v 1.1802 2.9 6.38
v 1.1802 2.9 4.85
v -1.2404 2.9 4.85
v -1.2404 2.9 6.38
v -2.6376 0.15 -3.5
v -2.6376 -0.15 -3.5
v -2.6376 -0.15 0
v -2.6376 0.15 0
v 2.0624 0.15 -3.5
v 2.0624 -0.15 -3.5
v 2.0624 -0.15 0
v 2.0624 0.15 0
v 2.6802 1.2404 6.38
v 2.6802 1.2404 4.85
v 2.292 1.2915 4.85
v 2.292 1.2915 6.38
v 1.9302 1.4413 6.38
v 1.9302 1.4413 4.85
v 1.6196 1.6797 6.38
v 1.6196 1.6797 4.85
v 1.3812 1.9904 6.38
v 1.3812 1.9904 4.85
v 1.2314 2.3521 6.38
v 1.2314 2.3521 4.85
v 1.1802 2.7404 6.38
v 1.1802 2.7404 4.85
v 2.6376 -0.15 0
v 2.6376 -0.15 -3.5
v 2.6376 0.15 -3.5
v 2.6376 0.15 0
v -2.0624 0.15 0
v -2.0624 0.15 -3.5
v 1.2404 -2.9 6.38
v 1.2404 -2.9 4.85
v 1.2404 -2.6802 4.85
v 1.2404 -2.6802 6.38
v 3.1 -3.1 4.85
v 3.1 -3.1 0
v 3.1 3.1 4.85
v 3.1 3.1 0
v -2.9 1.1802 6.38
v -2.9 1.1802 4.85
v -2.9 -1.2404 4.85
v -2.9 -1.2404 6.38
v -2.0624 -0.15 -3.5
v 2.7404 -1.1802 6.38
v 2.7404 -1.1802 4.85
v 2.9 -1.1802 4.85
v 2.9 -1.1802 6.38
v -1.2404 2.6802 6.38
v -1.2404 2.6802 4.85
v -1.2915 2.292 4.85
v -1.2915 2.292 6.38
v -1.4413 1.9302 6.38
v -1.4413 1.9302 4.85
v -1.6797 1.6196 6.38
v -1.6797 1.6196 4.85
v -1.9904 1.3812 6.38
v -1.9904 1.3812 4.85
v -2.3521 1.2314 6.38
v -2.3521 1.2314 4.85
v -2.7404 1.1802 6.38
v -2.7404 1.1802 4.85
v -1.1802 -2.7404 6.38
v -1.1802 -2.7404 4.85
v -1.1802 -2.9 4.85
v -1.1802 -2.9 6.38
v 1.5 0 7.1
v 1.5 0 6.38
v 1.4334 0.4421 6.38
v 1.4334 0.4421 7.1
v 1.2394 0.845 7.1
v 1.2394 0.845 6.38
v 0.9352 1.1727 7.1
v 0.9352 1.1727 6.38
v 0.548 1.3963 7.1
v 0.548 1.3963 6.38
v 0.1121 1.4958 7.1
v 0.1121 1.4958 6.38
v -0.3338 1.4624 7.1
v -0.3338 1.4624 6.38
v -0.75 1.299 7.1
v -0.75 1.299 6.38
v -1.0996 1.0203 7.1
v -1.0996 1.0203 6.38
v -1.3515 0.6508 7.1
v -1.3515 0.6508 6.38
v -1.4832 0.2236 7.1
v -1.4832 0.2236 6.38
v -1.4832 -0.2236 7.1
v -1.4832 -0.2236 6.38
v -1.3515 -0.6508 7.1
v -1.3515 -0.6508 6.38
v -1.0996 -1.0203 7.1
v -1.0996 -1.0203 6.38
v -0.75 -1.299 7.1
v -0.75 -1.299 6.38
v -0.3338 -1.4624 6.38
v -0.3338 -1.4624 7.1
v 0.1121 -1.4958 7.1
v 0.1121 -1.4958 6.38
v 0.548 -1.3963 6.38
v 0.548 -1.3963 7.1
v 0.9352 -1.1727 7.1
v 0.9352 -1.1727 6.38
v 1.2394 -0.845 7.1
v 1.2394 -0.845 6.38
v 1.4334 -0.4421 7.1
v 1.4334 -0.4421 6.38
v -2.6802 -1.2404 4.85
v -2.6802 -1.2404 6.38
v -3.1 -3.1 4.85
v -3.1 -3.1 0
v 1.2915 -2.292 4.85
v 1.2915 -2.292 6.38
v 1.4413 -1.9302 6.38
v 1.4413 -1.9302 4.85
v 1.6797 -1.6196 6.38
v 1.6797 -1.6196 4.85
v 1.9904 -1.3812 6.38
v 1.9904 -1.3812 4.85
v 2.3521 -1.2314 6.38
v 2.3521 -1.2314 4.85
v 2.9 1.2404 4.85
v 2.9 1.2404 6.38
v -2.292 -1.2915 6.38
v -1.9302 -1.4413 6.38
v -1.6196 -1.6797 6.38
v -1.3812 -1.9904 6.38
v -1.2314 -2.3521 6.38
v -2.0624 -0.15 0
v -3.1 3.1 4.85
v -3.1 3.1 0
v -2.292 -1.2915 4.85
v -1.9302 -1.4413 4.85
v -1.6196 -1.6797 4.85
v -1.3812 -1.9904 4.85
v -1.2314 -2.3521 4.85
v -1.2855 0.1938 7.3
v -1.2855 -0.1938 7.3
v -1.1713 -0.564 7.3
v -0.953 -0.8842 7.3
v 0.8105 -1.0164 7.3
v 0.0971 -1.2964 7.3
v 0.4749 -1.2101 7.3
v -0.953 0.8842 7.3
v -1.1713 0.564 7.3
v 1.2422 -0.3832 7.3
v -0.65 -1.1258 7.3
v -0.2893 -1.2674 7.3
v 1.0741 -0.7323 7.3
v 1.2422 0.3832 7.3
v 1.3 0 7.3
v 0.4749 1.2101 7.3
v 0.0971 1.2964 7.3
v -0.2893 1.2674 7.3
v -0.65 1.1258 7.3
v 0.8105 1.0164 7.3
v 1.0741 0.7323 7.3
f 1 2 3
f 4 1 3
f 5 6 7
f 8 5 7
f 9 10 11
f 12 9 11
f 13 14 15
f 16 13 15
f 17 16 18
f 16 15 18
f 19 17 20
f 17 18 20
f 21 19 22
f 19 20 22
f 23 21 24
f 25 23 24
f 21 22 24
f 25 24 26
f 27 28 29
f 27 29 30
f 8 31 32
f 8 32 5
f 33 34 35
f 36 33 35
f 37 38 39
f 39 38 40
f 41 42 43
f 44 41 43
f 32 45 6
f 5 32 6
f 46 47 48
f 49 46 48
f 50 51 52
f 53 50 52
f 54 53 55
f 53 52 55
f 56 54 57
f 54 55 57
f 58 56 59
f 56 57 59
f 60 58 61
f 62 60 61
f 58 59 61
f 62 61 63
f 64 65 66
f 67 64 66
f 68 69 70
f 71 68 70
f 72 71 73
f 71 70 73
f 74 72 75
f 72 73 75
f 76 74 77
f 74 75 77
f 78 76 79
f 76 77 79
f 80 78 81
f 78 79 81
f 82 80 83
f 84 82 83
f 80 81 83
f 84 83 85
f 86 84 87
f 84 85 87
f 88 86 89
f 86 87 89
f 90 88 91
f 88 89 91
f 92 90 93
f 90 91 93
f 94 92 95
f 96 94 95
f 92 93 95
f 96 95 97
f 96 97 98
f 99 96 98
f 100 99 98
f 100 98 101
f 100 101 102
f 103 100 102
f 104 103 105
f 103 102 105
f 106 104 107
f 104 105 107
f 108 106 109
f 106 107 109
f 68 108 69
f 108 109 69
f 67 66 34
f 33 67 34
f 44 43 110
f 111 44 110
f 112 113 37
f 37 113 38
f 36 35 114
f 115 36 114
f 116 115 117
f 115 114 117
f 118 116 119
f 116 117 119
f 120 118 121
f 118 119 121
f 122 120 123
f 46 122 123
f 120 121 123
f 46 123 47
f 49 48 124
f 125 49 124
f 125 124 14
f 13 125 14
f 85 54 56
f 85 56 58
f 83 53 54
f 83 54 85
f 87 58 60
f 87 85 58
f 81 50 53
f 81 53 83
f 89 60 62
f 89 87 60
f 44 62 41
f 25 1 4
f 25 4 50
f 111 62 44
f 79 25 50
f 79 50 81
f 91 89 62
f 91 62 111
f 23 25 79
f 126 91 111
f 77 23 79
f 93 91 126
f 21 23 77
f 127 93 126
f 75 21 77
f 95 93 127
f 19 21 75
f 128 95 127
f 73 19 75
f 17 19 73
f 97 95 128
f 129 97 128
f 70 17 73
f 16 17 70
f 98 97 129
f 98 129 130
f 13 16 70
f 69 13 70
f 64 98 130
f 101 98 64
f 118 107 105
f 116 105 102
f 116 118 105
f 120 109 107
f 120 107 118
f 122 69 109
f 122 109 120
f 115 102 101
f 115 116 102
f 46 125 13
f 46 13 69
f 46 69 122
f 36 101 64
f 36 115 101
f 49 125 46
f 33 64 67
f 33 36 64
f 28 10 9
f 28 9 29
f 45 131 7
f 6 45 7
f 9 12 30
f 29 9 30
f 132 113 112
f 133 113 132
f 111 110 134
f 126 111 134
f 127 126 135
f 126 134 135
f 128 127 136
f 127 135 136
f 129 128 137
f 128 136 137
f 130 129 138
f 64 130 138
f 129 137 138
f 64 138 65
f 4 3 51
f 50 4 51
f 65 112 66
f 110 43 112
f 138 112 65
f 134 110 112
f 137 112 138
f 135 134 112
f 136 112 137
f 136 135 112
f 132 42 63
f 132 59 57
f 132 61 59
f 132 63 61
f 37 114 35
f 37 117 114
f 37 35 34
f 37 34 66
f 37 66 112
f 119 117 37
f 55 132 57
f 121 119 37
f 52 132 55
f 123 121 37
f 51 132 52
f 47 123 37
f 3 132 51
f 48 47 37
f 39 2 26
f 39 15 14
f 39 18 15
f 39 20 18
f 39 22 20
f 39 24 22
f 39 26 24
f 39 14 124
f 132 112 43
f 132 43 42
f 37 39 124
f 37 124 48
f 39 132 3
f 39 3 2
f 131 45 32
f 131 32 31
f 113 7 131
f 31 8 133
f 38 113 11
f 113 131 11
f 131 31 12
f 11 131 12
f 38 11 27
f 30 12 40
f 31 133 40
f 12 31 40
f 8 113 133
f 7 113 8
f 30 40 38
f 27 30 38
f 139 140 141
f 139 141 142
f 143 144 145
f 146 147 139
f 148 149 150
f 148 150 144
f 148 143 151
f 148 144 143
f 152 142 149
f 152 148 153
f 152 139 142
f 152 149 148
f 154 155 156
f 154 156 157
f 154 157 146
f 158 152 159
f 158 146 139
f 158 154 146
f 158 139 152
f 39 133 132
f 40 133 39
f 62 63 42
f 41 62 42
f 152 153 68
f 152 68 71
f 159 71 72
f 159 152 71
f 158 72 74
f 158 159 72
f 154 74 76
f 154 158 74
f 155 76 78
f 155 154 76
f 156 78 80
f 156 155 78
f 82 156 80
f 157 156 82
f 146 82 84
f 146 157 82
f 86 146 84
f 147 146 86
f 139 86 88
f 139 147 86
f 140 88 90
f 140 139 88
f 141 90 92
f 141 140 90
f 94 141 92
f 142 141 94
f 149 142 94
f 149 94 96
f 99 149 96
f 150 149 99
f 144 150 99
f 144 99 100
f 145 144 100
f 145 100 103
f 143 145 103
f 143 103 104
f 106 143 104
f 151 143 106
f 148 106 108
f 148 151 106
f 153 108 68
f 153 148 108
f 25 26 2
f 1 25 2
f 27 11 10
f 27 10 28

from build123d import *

# Parameters (mm, degrees)
F0_W            = 6.2
F0_H            = 6.2
F1_DEPTH        = 4.85
F3_DEPTH        = 1.53
F3_COPIES_COUNT = 4
F5_R            = 1.5
F6_DEPTH        = 0.92
F7_SIZE         = 0.2
F8_W            = 0.5751895329
F8_H            = 3.9063365496
F9_DEPTH        = 0.15


# Not quite as in the source:
# - a pattern or mirror of a feature is missing from the dataset's text; its kind, count and spacing are read off the source's solid


with BuildPart() as f1:
    # F0 (on Top) → F1 (new body)
    with BuildSketch(Plane.XY):
        Rectangle(F0_W, F0_H)
    extrude(amount=F1_DEPTH)

    # F2 (on face) → F3 (join)
    with BuildSketch(Plane.XY.offset(4.85)):
        with BuildLine():
            Line((1.1802440276, 2.9), (0, 2.9))
            Line((0, 2.9), (0, 0))
            Line((0, 0), (2.9, 0))
            Line((2.9, 0), (2.9, 1.2403748352))
            Line((2.9, 1.2403748352), (2.6802440276, 1.2403748352))
            ThreePointArc((2.6802440276, 1.2403748352), (1.6195838559, 1.6797146634), (1.1802440276, 2.7403748352))
            Line((1.1802440276, 2.7403748352), (1.1802440276, 2.9))
        make_face()
    f3 = extrude(amount=F3_DEPTH)

    # F3_copies: F3 ×4 about axis
    f3_copies_axis = Axis((0, 0, 0), (0, 0, 1))
    for i in range(1, F3_COPIES_COUNT):
        add(f3.rotate(f3_copies_axis, i * 360 / F3_COPIES_COUNT))

    # F5 (on face) → F6 (join)
    with BuildSketch(Plane.XY.offset(6.38)):
        Circle(F5_R)
    extrude(amount=F6_DEPTH)

    # F7
    f7_edges = [f1.edges().sort_by_distance(p)[0] for p in [
        (-1.5, 0, 7.3),
    ]]
    chamfer(f7_edges, length=F7_SIZE)

    # F8 (on Front) → F9 (join, symmetric)
    with BuildSketch(Plane.XZ):
        with Locations((2.35, -1.5468317252)):
            Rectangle(F8_W, F8_H)
    f9 = extrude(amount=F9_DEPTH, both=True)

    # F9_copies: F9 across plane
    add(f9.mirror(Plane(origin=(0, 0, 0), x_dir=(0, 0, -1), z_dir=(-1, 0, 0))))


solid = f1.part
